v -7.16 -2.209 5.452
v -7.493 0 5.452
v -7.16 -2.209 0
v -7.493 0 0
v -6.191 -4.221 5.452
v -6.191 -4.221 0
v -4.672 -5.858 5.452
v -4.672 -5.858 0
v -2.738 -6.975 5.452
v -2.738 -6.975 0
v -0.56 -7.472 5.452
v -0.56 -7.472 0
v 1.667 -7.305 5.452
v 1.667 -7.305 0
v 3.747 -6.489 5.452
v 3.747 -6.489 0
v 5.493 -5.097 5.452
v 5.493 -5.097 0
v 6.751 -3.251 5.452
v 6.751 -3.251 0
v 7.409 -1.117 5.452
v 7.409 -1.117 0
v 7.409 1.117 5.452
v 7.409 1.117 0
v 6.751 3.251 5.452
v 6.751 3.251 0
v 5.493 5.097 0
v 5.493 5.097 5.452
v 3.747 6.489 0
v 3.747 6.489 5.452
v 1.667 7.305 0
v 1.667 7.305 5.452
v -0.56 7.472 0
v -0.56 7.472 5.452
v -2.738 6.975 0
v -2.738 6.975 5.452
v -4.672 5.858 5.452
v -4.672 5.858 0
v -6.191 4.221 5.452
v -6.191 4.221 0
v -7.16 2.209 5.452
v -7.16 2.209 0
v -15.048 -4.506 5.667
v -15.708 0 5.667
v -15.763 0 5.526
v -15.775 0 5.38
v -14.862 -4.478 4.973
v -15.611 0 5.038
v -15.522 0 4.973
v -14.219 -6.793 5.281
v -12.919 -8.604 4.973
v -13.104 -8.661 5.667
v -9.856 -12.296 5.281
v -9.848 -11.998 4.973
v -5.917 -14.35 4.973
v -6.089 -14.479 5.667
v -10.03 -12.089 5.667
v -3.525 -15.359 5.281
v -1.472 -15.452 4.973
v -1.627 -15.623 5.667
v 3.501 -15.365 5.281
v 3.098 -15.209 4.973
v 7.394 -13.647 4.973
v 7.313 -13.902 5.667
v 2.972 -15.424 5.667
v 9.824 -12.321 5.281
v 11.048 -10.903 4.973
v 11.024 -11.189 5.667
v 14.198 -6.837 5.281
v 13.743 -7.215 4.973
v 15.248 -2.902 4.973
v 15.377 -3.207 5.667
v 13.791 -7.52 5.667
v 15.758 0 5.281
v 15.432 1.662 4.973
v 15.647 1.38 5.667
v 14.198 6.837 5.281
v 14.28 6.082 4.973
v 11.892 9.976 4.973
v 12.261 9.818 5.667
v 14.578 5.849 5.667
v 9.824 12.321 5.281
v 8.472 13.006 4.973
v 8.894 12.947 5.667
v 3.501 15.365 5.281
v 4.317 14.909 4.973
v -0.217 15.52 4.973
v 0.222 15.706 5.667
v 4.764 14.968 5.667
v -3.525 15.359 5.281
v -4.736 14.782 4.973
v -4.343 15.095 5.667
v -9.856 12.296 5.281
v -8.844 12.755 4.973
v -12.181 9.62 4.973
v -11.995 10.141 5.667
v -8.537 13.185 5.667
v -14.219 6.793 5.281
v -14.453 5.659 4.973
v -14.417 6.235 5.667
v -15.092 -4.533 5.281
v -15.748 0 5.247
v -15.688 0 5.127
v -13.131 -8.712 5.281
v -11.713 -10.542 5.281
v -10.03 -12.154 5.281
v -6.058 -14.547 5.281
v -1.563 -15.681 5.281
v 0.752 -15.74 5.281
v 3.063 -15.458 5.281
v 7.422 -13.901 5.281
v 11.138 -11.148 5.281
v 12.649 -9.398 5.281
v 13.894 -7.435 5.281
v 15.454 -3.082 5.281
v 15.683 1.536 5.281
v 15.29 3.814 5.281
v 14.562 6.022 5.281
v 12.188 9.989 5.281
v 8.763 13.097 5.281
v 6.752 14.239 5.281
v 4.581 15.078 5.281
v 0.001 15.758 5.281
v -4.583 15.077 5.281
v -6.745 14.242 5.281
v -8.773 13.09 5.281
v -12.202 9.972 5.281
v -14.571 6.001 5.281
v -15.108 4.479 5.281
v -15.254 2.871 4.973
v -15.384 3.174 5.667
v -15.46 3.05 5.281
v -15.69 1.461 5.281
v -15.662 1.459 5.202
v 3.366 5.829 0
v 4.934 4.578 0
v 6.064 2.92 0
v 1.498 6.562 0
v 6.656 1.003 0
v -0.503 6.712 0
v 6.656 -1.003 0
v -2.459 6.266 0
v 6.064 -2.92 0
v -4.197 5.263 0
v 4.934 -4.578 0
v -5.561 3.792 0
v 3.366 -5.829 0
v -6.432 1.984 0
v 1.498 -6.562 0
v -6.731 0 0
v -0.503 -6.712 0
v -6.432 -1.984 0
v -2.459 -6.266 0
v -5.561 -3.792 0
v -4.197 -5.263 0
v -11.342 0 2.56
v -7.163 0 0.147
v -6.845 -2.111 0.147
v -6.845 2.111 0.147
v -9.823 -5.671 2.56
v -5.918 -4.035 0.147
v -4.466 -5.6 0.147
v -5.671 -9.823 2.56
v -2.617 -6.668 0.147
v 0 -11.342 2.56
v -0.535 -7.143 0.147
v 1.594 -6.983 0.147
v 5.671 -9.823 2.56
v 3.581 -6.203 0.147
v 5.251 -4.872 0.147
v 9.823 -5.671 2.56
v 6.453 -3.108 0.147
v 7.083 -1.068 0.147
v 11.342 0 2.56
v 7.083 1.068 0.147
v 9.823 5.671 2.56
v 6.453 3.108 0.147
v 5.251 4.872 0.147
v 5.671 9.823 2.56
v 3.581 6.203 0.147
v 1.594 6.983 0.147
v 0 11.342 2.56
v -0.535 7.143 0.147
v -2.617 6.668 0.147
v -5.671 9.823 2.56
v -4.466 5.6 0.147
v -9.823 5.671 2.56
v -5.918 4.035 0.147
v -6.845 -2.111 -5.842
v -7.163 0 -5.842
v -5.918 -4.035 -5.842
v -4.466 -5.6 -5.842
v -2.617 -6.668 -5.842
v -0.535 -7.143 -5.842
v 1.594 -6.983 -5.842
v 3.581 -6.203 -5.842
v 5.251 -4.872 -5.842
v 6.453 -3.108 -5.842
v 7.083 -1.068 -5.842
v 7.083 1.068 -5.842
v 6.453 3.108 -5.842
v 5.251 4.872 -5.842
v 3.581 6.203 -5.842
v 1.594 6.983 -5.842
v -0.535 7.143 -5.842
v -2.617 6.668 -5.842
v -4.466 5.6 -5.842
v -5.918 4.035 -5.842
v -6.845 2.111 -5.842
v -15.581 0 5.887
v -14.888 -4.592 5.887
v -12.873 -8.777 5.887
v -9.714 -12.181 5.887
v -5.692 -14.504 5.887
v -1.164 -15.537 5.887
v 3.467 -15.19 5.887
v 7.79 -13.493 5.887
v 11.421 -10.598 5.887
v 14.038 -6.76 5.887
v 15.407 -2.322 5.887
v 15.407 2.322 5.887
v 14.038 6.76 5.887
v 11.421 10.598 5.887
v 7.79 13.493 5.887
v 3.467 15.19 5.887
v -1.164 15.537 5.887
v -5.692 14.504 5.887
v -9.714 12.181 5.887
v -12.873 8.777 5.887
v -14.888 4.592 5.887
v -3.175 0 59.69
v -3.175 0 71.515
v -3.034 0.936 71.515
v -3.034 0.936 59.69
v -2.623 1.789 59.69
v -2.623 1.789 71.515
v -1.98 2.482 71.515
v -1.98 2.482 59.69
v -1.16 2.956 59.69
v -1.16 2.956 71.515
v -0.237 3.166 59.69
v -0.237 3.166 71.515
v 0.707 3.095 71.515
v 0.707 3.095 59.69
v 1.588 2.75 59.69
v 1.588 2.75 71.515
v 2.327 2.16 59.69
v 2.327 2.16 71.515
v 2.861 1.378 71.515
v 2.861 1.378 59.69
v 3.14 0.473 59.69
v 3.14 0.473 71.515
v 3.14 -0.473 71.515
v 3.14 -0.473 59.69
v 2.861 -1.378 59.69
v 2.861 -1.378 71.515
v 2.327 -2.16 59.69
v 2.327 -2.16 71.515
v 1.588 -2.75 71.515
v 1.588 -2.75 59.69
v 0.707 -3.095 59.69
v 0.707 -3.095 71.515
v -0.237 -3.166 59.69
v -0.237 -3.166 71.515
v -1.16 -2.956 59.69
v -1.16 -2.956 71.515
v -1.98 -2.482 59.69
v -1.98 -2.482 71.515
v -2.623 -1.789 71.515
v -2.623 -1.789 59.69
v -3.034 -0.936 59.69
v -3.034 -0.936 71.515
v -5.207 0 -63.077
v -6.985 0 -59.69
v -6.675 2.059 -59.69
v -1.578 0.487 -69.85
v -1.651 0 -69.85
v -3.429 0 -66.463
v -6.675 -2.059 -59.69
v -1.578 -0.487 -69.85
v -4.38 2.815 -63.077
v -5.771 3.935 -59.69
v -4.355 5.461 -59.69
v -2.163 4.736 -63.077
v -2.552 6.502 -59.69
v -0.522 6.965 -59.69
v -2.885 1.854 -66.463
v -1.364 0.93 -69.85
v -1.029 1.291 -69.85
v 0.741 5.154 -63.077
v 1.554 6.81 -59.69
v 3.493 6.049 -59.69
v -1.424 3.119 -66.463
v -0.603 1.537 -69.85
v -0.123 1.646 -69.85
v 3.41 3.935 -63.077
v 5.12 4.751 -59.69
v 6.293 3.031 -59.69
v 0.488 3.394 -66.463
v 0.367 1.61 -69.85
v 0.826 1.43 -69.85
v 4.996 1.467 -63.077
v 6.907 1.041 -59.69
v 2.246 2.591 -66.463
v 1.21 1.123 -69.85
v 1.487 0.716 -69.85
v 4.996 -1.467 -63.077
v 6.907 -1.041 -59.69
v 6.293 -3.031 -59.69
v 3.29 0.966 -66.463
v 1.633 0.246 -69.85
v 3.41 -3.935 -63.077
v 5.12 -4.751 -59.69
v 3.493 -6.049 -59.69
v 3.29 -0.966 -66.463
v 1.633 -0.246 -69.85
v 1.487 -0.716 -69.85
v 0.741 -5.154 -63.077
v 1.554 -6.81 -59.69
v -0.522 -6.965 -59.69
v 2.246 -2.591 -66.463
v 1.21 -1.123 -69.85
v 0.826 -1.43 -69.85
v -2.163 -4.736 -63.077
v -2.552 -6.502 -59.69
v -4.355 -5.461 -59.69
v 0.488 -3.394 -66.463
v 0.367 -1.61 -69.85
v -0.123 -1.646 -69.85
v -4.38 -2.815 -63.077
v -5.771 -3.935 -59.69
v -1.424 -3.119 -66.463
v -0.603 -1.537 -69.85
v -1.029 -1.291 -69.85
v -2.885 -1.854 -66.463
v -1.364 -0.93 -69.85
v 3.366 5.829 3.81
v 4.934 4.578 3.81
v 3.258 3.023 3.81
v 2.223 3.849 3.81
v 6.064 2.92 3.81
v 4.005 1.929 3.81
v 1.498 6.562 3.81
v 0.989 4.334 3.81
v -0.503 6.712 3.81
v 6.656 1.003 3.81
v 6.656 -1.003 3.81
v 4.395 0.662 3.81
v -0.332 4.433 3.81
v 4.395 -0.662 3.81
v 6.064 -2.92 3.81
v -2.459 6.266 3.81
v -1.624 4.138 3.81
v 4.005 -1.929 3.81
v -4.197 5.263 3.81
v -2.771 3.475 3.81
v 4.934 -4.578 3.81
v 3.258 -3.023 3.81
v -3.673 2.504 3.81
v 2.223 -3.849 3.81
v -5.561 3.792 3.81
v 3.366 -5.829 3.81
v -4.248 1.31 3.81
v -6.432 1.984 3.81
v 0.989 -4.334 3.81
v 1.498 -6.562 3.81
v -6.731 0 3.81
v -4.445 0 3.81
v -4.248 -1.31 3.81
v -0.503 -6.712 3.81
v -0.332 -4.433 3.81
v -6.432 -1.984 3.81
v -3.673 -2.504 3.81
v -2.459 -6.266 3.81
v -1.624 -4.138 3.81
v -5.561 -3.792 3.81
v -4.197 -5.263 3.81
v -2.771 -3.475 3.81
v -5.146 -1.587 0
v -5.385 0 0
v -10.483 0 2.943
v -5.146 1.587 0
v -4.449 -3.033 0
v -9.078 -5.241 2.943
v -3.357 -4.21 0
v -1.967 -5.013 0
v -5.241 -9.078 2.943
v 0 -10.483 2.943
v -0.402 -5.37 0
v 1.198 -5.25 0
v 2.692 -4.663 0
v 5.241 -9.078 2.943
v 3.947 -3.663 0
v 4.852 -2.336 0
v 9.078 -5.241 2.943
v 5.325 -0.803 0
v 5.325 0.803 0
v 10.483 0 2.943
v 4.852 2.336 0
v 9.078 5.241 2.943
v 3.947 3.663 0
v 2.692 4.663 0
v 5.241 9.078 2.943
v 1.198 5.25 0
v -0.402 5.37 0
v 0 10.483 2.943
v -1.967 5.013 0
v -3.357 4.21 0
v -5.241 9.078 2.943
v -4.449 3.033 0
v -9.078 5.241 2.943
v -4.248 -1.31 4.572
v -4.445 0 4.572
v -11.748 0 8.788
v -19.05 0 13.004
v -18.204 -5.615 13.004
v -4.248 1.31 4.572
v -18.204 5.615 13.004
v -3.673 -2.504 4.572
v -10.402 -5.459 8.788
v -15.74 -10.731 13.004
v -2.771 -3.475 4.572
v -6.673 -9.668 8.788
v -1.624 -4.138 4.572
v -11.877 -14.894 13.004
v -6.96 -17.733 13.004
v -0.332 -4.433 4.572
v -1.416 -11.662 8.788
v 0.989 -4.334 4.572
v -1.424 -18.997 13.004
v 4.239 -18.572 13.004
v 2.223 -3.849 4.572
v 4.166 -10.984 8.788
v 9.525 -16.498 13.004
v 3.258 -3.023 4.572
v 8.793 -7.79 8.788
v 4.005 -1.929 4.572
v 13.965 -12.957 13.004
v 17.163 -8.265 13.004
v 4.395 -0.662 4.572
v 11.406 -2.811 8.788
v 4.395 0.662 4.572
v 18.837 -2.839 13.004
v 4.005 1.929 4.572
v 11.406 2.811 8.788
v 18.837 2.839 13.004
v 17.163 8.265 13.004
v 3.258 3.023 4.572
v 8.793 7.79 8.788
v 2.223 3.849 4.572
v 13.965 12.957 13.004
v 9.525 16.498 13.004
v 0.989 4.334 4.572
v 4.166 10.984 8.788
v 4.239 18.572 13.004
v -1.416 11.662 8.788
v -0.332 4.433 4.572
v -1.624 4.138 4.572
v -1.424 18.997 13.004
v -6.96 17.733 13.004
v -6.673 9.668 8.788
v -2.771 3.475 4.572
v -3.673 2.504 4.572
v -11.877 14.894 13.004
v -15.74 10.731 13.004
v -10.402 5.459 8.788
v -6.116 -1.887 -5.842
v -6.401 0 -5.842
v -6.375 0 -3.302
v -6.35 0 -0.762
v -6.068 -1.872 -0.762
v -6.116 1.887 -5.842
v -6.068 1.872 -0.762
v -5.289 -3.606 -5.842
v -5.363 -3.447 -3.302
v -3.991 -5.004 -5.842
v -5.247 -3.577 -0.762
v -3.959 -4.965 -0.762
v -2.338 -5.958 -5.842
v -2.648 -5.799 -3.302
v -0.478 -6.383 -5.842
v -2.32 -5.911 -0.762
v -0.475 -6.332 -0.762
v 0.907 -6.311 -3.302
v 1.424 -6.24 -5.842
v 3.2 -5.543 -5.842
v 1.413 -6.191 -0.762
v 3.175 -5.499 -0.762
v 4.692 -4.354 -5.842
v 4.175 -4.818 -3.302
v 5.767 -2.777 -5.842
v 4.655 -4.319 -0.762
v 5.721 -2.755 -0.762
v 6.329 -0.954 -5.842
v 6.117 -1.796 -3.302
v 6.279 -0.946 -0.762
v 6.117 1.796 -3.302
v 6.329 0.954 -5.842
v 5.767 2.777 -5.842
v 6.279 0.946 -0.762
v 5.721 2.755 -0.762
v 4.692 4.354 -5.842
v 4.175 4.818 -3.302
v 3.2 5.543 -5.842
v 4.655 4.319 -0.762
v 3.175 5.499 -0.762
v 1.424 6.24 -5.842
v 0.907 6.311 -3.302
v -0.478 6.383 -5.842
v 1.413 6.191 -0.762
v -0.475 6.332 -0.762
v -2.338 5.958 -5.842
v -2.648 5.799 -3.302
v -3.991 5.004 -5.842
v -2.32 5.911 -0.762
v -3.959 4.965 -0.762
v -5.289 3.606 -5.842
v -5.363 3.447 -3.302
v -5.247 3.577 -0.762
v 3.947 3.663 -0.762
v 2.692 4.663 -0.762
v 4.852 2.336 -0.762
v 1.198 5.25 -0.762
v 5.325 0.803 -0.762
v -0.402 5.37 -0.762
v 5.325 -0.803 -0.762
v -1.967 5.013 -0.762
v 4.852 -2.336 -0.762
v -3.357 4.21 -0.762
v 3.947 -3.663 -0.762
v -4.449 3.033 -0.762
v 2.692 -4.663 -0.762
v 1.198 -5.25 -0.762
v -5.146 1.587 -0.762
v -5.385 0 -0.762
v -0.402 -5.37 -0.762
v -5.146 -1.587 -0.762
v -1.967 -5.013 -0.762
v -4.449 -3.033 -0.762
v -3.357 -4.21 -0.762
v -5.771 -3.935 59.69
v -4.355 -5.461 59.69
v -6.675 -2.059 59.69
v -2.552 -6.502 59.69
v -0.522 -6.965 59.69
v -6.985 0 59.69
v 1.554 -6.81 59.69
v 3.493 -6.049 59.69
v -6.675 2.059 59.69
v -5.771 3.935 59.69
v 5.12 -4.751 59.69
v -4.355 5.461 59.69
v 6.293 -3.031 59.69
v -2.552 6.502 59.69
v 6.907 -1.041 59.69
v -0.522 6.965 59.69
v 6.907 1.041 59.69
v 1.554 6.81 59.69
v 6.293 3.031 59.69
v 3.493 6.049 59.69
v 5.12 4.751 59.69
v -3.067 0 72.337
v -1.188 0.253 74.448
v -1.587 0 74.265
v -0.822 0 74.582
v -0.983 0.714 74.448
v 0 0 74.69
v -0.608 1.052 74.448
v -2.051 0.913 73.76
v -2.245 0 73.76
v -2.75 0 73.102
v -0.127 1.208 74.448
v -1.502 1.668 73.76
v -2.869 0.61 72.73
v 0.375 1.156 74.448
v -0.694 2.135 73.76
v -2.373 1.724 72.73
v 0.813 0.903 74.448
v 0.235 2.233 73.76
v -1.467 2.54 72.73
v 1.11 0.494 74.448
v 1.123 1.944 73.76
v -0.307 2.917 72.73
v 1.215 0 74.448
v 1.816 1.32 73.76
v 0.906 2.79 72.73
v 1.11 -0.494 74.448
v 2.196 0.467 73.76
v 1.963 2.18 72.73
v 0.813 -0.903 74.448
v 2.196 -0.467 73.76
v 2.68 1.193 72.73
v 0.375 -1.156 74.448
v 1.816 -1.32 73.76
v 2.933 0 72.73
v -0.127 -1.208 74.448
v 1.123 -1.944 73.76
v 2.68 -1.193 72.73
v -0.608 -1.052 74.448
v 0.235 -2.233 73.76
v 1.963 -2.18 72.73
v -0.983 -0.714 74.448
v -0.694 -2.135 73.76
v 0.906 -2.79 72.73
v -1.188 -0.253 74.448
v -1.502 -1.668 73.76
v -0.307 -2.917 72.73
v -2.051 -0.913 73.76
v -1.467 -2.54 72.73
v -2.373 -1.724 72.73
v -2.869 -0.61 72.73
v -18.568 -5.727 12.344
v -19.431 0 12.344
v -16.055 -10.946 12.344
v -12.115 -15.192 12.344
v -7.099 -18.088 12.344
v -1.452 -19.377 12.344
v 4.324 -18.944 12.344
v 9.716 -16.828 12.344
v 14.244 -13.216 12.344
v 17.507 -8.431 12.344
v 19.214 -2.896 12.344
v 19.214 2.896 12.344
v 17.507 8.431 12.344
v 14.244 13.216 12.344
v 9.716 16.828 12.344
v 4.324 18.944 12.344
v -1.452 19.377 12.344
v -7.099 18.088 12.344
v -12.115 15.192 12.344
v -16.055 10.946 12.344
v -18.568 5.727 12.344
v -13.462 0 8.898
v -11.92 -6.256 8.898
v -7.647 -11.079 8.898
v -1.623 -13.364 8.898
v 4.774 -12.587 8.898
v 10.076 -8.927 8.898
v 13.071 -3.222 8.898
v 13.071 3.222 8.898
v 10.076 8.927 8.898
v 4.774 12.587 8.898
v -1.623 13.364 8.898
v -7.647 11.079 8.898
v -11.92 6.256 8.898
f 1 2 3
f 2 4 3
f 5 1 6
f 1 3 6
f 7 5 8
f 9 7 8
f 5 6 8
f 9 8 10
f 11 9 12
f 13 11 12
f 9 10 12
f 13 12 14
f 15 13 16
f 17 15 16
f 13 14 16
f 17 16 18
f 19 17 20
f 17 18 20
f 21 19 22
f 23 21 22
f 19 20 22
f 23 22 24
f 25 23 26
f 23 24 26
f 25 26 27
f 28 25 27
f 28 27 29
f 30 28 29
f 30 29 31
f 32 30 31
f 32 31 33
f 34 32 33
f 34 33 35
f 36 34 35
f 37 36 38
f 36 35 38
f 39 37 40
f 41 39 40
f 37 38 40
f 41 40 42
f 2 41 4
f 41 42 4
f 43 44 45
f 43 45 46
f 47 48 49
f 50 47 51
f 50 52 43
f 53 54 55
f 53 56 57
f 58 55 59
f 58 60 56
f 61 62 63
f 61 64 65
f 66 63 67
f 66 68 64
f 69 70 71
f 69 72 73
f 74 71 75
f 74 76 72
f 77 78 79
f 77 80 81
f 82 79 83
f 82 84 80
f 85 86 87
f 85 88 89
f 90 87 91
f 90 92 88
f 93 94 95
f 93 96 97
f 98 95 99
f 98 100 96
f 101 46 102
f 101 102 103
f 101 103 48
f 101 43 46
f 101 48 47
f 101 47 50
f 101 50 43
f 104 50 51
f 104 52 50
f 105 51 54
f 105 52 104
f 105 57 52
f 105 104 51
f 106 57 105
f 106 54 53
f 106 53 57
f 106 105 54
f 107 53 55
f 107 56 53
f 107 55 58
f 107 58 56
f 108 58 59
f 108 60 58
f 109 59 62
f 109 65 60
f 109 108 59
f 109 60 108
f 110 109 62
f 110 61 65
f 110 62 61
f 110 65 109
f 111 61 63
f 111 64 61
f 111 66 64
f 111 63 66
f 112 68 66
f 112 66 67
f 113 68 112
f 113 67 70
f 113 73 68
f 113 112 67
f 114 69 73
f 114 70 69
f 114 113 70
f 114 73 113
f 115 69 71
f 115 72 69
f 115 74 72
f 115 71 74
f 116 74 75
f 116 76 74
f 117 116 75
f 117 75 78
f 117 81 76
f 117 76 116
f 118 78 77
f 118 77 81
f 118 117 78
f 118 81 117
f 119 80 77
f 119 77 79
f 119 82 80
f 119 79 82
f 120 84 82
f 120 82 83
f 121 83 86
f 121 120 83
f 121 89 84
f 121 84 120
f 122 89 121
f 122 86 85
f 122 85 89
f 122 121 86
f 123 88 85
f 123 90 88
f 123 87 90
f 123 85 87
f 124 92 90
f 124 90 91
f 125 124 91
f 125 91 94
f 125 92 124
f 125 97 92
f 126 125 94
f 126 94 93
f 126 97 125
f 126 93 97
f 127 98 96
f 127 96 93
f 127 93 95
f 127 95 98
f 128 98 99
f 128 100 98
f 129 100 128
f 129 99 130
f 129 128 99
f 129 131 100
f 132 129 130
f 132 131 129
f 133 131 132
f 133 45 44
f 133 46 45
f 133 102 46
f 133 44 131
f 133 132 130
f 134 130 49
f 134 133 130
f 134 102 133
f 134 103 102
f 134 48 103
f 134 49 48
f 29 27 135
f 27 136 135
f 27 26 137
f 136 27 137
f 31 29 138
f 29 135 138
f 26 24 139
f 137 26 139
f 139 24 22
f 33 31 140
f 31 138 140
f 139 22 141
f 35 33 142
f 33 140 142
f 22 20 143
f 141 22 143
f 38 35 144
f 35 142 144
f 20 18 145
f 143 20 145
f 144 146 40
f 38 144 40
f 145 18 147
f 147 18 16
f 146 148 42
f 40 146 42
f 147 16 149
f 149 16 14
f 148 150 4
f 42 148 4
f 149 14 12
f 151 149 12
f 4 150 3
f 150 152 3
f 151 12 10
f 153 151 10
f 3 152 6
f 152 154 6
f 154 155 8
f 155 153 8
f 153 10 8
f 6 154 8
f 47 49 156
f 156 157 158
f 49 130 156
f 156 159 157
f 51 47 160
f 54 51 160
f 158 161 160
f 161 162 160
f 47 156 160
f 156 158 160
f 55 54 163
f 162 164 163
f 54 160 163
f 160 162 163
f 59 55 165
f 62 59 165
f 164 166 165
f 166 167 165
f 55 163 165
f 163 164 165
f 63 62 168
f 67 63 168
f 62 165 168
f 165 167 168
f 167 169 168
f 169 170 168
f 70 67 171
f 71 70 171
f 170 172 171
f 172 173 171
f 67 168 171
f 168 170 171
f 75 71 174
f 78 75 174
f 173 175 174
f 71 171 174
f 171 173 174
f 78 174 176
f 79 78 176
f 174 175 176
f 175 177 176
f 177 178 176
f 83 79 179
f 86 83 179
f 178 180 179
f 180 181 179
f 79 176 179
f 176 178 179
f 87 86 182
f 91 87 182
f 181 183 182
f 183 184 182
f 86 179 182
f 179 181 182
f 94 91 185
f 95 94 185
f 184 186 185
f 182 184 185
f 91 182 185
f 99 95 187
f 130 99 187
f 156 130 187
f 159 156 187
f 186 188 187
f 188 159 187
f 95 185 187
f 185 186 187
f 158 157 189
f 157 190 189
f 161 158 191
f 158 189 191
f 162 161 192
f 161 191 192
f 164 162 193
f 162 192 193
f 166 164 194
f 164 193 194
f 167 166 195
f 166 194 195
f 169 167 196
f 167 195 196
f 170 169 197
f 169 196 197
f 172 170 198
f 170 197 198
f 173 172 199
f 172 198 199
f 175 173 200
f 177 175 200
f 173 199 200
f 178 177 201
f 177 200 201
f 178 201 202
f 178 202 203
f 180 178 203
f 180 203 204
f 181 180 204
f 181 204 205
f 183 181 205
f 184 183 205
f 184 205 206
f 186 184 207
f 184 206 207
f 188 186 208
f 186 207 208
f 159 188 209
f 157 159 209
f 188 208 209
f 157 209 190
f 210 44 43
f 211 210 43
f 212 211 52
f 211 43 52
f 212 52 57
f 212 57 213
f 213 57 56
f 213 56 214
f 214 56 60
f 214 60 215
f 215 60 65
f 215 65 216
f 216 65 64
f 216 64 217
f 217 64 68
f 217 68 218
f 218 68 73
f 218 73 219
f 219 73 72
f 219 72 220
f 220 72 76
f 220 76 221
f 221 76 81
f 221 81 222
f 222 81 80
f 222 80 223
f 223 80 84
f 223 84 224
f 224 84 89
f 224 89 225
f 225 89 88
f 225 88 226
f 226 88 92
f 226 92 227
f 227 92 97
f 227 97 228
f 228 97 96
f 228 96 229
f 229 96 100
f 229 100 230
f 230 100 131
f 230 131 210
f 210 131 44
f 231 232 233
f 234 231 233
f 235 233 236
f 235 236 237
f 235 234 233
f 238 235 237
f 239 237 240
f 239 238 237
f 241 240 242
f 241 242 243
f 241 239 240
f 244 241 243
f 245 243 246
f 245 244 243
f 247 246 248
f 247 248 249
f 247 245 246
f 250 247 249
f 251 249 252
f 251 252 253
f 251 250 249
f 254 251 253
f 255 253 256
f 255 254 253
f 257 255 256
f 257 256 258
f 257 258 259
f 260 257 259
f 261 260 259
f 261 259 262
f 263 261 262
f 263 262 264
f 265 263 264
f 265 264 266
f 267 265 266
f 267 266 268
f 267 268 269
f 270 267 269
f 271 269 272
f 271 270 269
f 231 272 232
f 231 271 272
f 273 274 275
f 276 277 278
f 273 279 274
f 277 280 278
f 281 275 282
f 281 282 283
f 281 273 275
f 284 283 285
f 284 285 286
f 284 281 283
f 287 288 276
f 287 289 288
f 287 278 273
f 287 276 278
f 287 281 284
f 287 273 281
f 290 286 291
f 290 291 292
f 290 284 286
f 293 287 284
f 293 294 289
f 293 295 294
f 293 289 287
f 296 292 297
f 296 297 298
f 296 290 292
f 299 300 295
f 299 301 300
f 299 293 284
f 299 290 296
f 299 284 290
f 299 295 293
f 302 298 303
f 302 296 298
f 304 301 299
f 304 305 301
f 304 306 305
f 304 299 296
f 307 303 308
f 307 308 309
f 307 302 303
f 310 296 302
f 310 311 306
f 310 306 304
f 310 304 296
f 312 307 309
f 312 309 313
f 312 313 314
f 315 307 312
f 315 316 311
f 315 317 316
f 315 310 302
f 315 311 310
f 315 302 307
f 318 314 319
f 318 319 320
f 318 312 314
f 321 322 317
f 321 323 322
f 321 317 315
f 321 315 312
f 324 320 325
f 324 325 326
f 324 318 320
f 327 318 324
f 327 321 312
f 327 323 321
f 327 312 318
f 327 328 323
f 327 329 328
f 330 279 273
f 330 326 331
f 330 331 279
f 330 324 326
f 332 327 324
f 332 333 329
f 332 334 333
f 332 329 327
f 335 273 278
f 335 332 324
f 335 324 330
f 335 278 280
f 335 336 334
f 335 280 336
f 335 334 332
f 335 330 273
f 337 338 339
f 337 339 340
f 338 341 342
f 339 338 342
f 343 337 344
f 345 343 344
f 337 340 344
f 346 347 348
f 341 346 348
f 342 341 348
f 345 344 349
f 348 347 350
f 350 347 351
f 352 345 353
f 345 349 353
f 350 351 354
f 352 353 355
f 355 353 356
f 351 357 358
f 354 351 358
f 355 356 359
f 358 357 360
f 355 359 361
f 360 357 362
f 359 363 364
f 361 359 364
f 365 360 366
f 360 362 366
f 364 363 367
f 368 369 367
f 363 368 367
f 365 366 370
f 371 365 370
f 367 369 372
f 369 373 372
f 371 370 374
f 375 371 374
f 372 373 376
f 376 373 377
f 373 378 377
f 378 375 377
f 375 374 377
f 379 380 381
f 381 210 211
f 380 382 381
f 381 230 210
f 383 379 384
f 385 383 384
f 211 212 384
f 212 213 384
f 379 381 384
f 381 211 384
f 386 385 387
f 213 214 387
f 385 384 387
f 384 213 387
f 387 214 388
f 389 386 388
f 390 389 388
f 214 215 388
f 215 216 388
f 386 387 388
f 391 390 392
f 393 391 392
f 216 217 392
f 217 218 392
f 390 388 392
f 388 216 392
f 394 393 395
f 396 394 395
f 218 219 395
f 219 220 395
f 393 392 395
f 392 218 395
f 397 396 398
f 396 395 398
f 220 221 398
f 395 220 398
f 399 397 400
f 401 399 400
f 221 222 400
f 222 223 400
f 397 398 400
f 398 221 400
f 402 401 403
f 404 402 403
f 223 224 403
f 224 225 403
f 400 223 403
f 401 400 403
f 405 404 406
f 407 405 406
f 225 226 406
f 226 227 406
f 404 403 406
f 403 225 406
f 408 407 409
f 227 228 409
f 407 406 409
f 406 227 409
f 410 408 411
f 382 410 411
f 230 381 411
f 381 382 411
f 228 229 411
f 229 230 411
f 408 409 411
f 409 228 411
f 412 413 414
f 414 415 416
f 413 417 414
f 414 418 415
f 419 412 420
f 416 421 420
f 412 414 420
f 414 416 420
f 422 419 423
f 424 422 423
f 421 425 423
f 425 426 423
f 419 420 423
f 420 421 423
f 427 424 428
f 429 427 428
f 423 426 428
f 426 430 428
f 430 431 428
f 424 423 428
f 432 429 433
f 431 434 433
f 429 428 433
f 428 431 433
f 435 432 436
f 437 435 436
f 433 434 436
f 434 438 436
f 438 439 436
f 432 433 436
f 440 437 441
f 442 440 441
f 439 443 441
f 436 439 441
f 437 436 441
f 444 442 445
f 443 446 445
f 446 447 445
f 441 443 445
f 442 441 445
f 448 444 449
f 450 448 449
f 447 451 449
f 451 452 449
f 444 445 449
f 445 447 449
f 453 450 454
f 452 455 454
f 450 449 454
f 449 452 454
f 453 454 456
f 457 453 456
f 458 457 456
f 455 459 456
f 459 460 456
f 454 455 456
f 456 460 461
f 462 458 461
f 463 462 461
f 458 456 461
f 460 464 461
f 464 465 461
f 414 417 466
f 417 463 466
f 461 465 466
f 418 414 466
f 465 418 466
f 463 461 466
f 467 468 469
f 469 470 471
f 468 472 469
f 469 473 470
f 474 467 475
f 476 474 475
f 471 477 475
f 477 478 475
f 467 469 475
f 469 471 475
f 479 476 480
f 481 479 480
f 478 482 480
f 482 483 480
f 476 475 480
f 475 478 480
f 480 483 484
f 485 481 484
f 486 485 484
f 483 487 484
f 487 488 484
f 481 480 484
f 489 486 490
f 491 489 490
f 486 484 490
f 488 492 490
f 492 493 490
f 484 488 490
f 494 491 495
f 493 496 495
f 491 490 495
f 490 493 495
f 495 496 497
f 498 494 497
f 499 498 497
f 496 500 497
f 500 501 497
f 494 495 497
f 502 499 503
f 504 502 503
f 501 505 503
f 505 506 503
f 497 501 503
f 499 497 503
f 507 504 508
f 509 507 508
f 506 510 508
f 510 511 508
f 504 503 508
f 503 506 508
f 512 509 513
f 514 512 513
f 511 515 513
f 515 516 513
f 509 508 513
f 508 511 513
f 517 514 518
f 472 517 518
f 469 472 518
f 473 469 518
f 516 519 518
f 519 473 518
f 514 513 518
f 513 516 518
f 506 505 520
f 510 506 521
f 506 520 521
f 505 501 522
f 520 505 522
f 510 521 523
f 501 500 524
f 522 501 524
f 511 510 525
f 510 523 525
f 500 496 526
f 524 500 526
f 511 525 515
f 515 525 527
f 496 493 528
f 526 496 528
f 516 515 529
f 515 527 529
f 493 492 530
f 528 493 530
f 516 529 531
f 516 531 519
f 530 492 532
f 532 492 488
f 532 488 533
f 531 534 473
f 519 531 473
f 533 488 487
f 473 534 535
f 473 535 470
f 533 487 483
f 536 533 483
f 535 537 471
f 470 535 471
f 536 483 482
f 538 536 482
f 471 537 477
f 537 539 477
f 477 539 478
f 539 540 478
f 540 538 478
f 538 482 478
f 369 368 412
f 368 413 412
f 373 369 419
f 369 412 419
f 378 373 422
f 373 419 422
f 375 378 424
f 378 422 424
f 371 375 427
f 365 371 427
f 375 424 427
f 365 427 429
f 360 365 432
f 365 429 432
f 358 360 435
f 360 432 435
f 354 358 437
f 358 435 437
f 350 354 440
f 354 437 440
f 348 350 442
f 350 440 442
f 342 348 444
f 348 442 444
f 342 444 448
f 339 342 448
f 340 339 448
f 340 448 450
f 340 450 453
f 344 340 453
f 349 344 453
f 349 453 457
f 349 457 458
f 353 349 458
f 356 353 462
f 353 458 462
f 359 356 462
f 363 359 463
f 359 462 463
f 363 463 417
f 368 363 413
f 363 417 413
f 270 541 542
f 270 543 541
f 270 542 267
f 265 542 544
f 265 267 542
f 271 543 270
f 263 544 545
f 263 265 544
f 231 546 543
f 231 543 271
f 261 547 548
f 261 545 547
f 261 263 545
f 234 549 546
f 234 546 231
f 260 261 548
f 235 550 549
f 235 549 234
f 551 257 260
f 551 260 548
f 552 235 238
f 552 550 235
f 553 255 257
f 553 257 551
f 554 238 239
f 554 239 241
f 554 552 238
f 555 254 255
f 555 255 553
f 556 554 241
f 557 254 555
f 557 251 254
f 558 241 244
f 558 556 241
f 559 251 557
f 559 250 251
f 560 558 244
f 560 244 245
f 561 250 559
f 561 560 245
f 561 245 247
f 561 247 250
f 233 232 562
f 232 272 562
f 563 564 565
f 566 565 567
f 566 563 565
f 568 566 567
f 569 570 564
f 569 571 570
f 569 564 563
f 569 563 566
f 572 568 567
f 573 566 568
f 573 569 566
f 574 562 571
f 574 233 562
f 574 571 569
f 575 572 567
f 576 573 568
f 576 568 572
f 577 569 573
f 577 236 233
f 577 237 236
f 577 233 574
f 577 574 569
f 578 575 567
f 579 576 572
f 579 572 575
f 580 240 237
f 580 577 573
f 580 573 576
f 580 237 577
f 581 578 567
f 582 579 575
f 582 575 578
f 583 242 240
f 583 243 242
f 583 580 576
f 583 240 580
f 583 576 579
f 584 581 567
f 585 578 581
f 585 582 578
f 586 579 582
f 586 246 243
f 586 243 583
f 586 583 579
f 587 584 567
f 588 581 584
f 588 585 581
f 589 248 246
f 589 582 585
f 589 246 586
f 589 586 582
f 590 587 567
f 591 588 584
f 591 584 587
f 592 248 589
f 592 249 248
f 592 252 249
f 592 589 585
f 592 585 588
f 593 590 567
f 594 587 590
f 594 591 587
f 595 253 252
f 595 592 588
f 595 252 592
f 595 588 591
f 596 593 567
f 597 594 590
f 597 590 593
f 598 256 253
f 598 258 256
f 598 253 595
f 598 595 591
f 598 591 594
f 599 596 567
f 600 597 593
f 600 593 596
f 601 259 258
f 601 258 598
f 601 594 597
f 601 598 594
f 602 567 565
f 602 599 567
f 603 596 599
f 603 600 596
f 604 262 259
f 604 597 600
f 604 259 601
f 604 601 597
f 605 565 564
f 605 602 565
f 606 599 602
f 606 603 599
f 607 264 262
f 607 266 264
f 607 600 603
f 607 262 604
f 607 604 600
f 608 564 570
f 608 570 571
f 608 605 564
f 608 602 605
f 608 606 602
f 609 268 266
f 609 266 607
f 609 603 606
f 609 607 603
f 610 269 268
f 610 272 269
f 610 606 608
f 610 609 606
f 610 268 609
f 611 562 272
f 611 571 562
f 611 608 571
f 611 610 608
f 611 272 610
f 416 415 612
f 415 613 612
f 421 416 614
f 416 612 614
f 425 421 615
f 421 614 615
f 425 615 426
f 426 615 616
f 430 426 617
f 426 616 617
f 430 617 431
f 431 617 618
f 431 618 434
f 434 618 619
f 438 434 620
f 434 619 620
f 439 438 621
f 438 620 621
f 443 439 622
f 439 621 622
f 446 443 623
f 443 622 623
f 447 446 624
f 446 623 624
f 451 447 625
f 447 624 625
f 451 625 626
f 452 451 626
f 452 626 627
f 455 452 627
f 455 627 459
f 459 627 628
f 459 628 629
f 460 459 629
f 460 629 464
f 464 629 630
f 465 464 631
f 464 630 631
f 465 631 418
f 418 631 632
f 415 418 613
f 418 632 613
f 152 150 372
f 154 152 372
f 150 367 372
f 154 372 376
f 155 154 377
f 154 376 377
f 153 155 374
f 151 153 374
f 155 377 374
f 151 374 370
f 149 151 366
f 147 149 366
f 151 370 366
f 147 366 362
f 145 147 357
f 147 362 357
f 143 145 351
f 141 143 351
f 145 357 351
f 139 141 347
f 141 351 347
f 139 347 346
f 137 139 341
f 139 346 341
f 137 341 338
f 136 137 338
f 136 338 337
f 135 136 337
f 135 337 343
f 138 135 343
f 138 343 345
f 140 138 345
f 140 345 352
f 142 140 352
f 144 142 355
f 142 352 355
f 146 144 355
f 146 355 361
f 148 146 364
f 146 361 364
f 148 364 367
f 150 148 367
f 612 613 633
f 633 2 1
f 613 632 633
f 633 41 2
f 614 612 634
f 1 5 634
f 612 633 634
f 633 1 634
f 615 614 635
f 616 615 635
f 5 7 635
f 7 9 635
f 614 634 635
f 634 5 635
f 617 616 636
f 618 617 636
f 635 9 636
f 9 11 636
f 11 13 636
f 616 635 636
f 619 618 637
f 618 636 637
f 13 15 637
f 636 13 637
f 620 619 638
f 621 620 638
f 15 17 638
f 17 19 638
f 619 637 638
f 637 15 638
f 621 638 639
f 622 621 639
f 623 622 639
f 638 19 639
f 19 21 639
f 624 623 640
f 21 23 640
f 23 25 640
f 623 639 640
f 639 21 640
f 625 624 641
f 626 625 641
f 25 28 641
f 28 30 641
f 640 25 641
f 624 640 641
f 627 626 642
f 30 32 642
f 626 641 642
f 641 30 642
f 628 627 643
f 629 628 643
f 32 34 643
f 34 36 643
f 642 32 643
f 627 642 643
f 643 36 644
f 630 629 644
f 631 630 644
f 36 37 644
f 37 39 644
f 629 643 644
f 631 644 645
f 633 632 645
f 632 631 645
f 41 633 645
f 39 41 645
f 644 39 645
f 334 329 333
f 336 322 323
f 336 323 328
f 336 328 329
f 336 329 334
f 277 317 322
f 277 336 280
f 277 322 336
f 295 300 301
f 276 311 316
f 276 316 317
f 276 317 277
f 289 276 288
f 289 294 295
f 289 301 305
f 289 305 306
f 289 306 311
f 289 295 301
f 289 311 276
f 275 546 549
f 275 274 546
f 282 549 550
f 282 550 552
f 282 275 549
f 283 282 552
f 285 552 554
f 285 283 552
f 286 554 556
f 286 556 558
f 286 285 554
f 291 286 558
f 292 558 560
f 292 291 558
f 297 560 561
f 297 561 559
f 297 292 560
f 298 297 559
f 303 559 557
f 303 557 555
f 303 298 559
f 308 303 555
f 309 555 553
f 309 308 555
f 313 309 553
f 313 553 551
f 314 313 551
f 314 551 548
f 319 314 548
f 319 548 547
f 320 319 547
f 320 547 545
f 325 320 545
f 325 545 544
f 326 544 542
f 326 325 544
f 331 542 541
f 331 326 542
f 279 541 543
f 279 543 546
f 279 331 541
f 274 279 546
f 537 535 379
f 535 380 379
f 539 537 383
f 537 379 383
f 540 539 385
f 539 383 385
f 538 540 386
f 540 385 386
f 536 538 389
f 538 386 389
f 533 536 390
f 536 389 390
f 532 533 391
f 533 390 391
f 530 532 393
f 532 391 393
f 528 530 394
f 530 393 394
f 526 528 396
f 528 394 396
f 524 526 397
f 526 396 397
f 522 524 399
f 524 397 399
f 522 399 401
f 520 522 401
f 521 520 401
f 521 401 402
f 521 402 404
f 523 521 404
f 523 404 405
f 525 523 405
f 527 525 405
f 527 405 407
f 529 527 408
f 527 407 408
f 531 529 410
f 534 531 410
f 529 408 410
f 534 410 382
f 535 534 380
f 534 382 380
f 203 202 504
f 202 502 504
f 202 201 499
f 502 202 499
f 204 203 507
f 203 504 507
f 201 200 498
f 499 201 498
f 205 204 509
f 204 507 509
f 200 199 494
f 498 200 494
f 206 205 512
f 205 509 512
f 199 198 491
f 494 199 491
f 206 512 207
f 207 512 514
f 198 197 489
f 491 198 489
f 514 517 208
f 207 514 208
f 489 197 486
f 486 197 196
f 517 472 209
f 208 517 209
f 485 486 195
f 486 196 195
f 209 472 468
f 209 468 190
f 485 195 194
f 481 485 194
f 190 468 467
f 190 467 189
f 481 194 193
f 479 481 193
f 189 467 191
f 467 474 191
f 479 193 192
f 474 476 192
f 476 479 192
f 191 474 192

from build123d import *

# Parameters (mm, degrees)
F4_R = 3.175
F7_R = 0.508


with BuildPart() as f1:
    # F0 (on Front) → F1 (revolve)
    with BuildSketch(Plane.XZ):
        Polygon((-4.445, 3.81), (-4.445, 4.572), (-19.05, 13.004201), (-19.431, 12.344289), (-7.493, 5.451882), (-7.493, 0), (-6.731, 0), (-6.731, 3.81), align=None)
    revolve(axis=Axis((0, 0, 10.120624), (0, 0, 1)))


with BuildPart() as f3:
    # F2 (on Front) → F3 (revolve)
    with BuildSketch(Plane.XZ):
        Polygon((0, -69.85), (0, 74.69), (-3.175, 74.69), (-3.175, 59.69), (-6.985, 59.69), (-6.985, -59.69), (-1.651, -69.85), align=None)
    revolve(axis=Axis((0, 0, 2.42), (0, 0, -1)))

    # F4
    f4_edges = [f3.edges().sort_by_distance(p)[0] for p in [
        (3.175, 0, 74.69),
    ]]
    fillet(f4_edges, radius=F4_R)


with BuildPart() as f6:
    # F5 (on Front) → F6 (revolve)
    with BuildSketch(Plane.XZ):
        Polygon((-5.3848, -0.762), (-5.3848, 0), (-15.580618, 5.886558), (-15.961618, 5.226647), (-7.1628, 0.146647), (-7.1628, -5.842), (-6.4008, -5.842), (-6.35, -0.762), align=None)
    revolve(axis=Axis((0, 0, 0), (0, 0, 1)))

    # F7
    f7_edges = [f6.edges().sort_by_distance(p)[0] for p in [
        (15.961618, 0, 5.226647),
    ]]
    fillet(f7_edges, radius=F7_R)


solid = Compound([f1.part, f3.part, f6.part])
